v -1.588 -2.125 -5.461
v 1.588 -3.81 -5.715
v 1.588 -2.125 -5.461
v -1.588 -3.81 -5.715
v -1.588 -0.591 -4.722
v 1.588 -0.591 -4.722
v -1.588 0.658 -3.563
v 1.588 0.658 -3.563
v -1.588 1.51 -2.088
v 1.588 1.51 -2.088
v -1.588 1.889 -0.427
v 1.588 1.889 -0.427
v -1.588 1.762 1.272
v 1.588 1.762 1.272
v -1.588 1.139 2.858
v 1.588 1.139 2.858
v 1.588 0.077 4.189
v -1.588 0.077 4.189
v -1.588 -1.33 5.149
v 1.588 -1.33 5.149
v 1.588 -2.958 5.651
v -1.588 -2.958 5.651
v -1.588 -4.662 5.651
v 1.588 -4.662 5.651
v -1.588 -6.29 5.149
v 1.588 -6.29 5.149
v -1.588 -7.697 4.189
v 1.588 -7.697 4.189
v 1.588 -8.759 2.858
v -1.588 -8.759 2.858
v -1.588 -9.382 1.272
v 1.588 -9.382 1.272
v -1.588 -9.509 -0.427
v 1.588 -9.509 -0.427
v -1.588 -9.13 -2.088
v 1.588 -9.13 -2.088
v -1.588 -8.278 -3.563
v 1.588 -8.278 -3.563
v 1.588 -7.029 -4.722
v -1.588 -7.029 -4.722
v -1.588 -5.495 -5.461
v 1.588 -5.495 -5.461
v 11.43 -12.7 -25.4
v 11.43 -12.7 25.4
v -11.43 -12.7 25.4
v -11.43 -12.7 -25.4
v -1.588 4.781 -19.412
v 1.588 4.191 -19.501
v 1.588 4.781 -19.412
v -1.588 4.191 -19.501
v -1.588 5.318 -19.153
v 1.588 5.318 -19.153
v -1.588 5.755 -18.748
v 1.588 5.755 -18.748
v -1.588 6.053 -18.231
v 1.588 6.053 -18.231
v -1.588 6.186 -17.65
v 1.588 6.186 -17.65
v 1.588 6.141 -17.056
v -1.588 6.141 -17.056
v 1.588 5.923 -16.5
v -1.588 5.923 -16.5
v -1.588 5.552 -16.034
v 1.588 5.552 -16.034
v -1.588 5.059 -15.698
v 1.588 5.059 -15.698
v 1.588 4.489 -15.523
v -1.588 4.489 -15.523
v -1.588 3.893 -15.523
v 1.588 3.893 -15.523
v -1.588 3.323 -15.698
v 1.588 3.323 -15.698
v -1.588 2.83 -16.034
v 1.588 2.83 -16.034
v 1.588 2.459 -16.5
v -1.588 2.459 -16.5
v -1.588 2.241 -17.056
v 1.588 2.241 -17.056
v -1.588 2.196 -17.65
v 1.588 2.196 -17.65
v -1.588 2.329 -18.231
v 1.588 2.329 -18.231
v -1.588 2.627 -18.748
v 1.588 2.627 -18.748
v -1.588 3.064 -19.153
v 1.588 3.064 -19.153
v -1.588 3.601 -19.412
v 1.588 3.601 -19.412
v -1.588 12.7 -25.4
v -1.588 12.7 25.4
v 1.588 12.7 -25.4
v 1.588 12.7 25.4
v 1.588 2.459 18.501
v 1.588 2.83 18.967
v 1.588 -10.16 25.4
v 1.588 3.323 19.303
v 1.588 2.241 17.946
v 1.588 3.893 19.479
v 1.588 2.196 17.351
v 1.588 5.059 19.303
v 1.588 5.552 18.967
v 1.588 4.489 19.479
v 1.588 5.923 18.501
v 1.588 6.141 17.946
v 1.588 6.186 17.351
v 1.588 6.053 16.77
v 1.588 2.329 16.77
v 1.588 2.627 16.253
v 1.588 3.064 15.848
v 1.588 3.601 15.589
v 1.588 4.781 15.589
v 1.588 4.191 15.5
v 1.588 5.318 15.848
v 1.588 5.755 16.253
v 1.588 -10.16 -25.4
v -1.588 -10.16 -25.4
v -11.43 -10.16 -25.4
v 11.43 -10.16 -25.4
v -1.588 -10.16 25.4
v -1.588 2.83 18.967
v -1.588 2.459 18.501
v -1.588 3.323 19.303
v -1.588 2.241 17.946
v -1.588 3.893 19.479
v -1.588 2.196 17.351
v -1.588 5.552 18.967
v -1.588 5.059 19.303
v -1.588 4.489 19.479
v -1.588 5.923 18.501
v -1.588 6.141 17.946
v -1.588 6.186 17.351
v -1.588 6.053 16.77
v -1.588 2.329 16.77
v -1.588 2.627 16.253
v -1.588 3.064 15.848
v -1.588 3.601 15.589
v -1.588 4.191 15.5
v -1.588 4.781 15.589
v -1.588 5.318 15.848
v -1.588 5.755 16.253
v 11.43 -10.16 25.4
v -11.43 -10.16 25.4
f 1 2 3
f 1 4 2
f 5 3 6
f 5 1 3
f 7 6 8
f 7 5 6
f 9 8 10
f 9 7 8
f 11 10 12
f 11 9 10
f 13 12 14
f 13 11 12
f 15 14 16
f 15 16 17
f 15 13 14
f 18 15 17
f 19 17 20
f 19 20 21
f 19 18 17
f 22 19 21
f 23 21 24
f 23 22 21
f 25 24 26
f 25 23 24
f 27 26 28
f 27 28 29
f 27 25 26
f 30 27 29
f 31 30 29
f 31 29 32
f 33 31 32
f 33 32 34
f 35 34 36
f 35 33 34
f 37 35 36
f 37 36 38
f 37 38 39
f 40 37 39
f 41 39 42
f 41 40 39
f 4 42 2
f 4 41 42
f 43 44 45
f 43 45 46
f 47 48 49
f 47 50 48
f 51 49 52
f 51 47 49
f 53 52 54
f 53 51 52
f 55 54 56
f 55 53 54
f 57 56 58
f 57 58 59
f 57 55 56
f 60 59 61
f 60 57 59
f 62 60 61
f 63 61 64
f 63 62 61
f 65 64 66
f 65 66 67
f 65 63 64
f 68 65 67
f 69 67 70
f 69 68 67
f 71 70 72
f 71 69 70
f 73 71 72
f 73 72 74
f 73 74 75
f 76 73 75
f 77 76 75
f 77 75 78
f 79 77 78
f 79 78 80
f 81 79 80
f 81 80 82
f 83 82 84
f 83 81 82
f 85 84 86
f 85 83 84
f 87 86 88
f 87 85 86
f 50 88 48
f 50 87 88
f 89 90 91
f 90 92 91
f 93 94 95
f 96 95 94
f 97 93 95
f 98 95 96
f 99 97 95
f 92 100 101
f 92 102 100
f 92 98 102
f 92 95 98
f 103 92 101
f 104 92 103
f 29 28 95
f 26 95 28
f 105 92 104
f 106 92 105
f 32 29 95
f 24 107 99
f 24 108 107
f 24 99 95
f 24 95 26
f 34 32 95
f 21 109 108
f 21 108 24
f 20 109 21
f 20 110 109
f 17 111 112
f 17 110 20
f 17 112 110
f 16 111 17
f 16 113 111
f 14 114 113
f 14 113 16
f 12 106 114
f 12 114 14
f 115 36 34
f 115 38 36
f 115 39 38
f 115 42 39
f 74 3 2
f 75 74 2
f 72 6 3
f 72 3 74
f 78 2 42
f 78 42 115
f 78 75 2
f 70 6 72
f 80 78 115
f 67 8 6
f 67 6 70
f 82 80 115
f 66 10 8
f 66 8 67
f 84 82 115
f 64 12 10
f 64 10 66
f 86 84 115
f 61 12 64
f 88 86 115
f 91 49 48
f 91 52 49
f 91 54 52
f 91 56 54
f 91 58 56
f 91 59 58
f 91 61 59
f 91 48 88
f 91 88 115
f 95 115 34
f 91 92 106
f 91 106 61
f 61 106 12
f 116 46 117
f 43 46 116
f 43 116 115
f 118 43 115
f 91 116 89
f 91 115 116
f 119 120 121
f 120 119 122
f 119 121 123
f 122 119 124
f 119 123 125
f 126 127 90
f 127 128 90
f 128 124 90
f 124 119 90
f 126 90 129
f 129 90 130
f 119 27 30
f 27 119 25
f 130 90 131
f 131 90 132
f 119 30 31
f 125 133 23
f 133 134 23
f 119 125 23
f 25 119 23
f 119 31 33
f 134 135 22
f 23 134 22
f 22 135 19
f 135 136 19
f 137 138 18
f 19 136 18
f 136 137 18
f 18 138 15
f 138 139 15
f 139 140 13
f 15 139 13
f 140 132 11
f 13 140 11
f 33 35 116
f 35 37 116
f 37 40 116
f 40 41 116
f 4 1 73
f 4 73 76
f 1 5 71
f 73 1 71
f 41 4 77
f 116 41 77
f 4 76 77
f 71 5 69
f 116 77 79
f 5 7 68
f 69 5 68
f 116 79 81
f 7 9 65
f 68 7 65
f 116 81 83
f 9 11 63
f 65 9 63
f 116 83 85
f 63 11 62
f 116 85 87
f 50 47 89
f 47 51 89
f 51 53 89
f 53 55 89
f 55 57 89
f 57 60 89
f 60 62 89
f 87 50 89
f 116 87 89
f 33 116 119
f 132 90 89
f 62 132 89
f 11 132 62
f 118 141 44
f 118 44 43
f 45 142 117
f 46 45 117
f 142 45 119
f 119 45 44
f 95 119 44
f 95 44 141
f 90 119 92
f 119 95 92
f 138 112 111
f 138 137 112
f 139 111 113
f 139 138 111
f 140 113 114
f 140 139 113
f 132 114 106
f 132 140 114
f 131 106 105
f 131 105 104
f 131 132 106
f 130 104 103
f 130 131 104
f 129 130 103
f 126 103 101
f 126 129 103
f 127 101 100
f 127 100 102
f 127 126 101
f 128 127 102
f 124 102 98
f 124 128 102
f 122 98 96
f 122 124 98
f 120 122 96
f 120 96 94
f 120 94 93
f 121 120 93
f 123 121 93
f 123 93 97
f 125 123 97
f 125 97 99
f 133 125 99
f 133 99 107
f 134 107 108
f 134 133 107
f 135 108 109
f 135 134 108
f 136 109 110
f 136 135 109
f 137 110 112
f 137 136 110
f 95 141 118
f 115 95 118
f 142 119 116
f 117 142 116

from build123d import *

# Parameters (mm, degrees)
SKETCH3_W           = 50.8
SKETCH3_H           = 25.4
SKETCH3_R           = 2.00025
SKETCH3_R_2         = 5.715
BOSS_EXTRUDE1_DEPTH = 1.5875
SKETCH4_W           = 50.8
SKETCH4_H           = 2.54
BOSS_EXTRUDE2_DEPTH = 11.43


with BuildPart() as part:
    # Sketch3 → Boss-Extrude1 (new, symmetric)
    with BuildSketch(Plane(origin=(0, 0, 0), x_dir=(0, 0, -1), z_dir=(1, 0, 0))):
        Rectangle(SKETCH3_W, SKETCH3_H)
        with Locations((-17.5006, 4.191)):
            Circle(SKETCH3_R, mode=Mode.SUBTRACT)
        with Locations((17.5006, 4.191)):
            Circle(SKETCH3_R, mode=Mode.SUBTRACT)
        with Locations((0, -3.81)):
            Circle(SKETCH3_R_2, mode=Mode.SUBTRACT)
    extrude(amount=BOSS_EXTRUDE1_DEPTH, both=True)

    # Sketch4 → Boss-Extrude2 (add, symmetric)
    with BuildSketch(Plane(origin=(0, 0, 0), x_dir=(0, 0, -1), z_dir=(1, 0, 0))):
        with Locations((0, -11.43)):
            Rectangle(SKETCH4_W, SKETCH4_H)
    extrude(amount=BOSS_EXTRUDE2_DEPTH, both=True)


solid = part.part
